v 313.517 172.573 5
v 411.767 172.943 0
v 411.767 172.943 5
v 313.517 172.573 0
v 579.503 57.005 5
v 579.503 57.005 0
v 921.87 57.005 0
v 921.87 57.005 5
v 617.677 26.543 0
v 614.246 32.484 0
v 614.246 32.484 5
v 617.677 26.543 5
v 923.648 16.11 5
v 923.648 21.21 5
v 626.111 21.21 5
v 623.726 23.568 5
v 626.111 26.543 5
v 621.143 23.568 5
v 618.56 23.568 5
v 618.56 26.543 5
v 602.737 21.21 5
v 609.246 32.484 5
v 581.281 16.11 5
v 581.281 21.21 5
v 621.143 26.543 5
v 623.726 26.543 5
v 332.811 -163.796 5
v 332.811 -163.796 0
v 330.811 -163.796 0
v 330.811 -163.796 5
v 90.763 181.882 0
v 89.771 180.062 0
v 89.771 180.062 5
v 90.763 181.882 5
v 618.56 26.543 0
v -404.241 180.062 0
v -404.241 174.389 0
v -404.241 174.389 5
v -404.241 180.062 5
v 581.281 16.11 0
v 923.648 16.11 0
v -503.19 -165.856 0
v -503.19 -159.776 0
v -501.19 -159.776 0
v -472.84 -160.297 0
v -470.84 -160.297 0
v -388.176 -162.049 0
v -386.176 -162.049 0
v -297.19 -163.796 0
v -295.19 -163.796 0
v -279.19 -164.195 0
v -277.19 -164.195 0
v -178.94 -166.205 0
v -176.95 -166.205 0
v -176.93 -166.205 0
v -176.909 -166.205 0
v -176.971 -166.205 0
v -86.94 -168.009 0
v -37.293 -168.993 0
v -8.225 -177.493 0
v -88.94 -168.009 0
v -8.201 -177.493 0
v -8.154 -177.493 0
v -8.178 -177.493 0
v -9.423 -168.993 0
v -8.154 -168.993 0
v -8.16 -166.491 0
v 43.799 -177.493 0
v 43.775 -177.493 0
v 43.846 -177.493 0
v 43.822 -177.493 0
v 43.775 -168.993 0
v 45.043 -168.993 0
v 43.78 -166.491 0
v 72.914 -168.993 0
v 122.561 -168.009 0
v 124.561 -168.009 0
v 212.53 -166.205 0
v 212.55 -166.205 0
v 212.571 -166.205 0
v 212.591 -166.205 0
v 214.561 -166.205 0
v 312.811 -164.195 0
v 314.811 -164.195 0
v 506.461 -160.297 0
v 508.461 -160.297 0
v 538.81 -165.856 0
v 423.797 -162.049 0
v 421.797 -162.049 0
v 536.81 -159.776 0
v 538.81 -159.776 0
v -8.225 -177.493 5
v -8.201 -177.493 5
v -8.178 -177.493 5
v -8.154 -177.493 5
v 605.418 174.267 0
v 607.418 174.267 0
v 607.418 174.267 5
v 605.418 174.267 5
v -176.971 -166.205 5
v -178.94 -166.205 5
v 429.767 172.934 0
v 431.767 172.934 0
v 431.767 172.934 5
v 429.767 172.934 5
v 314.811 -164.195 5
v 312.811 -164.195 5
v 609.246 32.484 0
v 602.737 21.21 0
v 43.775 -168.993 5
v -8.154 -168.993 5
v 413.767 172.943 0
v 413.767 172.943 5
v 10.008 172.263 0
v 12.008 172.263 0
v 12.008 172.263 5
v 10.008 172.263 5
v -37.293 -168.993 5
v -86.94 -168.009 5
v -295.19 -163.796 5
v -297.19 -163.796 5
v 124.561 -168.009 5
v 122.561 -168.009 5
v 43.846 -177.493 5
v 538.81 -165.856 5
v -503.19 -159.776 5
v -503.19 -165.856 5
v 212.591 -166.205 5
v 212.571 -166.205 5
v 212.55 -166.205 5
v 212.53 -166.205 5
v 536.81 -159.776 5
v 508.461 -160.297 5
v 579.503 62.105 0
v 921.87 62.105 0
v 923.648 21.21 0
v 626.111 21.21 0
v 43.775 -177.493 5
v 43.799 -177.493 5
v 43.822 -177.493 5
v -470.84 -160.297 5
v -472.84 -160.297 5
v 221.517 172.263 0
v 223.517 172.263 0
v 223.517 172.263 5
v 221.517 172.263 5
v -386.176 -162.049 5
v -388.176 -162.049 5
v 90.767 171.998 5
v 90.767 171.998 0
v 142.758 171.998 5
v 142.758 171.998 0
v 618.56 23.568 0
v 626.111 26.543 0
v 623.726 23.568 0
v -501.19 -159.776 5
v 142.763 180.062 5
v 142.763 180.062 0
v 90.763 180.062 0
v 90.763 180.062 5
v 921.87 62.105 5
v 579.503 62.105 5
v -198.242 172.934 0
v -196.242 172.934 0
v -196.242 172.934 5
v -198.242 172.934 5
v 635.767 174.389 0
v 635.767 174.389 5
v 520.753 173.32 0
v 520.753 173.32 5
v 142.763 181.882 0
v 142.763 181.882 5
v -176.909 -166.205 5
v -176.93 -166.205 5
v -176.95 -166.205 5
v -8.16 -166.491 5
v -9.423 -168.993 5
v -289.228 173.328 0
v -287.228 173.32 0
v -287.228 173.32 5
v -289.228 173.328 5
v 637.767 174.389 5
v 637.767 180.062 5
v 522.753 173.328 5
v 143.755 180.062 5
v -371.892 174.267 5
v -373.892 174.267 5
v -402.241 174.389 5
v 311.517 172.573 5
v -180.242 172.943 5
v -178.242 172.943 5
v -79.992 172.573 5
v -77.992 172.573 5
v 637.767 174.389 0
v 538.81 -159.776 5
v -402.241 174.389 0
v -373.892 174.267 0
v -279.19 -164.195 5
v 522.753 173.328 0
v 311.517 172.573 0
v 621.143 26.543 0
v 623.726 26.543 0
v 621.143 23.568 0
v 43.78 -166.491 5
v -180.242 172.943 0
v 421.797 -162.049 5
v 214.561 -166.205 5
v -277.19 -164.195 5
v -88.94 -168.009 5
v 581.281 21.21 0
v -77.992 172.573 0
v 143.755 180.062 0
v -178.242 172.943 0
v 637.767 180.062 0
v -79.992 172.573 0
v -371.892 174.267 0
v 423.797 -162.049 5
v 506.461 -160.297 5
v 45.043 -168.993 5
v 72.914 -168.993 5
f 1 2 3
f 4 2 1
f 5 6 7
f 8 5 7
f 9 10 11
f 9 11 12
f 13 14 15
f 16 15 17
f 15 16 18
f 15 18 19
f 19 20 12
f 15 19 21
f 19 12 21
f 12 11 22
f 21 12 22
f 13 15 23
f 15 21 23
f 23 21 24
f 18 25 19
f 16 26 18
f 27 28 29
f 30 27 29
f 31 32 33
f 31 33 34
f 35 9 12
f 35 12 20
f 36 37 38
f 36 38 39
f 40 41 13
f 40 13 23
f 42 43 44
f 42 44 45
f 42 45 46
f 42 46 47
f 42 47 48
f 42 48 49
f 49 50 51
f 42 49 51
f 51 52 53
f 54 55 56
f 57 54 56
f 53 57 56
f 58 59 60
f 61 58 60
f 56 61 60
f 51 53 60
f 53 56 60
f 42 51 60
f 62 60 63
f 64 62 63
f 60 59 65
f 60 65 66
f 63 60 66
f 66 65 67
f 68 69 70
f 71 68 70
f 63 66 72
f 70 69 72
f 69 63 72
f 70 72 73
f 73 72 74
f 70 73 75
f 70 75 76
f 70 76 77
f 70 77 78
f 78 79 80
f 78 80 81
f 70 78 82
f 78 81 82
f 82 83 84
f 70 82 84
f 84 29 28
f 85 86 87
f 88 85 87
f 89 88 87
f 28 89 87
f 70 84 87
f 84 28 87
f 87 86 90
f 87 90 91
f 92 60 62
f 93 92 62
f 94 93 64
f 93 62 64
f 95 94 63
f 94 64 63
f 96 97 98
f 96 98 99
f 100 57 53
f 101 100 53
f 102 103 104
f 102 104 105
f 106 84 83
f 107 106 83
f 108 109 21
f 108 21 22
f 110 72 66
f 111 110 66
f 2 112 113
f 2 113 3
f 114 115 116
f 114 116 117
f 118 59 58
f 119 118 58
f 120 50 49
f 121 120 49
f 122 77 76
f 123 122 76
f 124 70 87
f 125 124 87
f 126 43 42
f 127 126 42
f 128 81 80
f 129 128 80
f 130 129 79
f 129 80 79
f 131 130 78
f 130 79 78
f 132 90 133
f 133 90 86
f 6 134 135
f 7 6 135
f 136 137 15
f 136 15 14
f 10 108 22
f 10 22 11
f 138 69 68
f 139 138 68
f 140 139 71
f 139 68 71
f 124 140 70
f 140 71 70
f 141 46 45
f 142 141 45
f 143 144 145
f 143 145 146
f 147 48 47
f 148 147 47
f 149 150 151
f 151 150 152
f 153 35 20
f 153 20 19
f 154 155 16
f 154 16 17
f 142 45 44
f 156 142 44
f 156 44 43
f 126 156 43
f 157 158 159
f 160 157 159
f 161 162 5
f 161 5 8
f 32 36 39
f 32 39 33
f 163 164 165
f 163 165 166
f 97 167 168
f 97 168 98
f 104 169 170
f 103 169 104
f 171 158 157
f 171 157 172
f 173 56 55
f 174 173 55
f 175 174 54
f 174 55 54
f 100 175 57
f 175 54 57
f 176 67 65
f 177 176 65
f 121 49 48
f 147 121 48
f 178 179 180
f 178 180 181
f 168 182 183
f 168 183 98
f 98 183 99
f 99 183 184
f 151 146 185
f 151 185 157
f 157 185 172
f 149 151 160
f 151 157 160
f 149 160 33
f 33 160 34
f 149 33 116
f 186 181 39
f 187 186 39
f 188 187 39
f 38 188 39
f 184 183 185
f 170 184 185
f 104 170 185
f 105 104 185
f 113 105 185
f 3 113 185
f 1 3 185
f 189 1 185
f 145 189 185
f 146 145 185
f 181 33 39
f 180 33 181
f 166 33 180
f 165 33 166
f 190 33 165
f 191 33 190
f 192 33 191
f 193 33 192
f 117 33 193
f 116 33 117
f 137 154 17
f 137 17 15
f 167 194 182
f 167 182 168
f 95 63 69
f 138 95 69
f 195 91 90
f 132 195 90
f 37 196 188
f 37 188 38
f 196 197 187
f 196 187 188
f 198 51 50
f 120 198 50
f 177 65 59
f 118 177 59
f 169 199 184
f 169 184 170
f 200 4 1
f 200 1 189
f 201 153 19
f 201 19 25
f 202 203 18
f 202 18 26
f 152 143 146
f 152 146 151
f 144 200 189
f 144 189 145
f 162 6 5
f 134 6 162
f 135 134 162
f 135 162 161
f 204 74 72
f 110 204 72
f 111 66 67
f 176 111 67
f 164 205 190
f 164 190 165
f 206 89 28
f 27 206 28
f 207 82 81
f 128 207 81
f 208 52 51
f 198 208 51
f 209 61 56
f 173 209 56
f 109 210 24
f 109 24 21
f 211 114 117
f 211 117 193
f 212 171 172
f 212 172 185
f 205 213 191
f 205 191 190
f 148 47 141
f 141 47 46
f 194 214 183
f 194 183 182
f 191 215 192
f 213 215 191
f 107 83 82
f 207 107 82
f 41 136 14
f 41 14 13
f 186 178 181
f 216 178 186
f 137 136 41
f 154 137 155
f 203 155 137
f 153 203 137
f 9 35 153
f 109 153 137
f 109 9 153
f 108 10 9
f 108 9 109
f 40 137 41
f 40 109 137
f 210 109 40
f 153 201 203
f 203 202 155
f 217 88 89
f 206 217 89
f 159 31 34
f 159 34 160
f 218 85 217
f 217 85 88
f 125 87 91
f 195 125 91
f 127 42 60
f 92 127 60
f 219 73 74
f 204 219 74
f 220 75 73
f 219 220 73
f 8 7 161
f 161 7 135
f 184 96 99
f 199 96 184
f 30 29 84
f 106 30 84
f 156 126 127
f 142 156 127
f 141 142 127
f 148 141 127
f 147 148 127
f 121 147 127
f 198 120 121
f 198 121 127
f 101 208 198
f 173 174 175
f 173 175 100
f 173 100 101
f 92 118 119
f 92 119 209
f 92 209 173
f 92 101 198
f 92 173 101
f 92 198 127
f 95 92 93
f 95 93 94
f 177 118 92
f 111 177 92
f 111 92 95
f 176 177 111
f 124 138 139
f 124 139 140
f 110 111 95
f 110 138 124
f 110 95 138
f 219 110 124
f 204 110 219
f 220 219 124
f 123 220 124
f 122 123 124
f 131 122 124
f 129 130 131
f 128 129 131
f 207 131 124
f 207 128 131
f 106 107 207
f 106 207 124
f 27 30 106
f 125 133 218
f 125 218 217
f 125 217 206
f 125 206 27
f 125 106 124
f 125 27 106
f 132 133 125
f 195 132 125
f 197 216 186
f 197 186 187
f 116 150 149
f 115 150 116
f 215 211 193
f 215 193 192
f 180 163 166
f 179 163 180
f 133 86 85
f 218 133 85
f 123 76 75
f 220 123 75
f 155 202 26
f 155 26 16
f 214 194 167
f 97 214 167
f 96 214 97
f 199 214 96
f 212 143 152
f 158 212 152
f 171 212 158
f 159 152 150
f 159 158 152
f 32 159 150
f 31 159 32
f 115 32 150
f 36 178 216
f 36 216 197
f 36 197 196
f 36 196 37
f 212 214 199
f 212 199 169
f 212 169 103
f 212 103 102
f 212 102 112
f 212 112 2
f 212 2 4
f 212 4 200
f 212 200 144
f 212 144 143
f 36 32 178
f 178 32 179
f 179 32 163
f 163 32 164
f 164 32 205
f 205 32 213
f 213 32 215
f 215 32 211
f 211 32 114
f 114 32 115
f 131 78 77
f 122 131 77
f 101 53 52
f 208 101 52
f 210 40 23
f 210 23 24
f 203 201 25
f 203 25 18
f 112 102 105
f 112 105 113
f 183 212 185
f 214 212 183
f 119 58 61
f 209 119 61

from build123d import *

# Parameters (mm, degrees)
MODEL_W           = 342.366650955
MODEL_H           = 5.1
EXTRUDE_1_DEPTH   = 5
EXTRUDE_1_2_DEPTH = 5
EXTRUDE_1_3_DEPTH = 5
EXTRUDE_1_4_DEPTH = 5


with BuildPart() as part:
    # Model → 凸台-拉伸1 (new body)
    with BuildSketch(Plane.XY):
        with Locations((750.686747378, 59.554962924)):
            Rectangle(MODEL_W, MODEL_H)
    extrude(amount=EXTRUDE_1_DEPTH)


with BuildPart() as body_2:
    # Model → Extrude 1 2 (new body)
    with BuildSketch(Plane.XY):
        Polygon((614.246138188, 32.484405329), (617.67653772, 26.54277905), (618.559903109, 26.54277905), (618.559903109, 23.568043607), (621.143191819, 26.54277905), (621.143191819, 23.568043607), (623.726480529, 26.54277905), (623.726480529, 23.568043607), (626.111252729, 26.54277905), (626.111252729, 21.209813756), (923.648003194, 21.209813756), (923.648003194, 16.109813756), (581.281303194, 16.109813756), (581.281303194, 21.209813756), (602.736749709, 21.209813756), (609.246138188, 32.484405329), align=None)
    extrude(amount=EXTRUDE_1_2_DEPTH)


with BuildPart() as body_3:
    # Model → Extrude 1 3 (new body)
    with BuildSketch(Plane.XY):
        Polygon((143.754855357, 180.061566324), (637.766892066, 180.061566324), (637.766892066, 174.389466324), (635.766892066, 174.389466324), (607.417562069, 174.266766324), (605.417562069, 174.266766324), (522.753244134, 173.328437251), (520.753244134, 173.319766324), (431.767168163, 172.933970442), (429.767168163, 172.933966324), (413.767168163, 172.942566324), (411.767168163, 172.942566324), (313.517246909, 172.572666324), (311.517246909, 172.572666324), (223.517246909, 172.262766324), (221.517246909, 172.262766324), (142.758356713, 171.99776752), (116.762748322, 171.99776752), (90.767139931, 171.99776752), (12.008249736, 172.262766324), (10.008249736, 172.262766324), (-77.991750264, 172.572666324), (-79.991750264, 172.572666324), (-178.241671518, 172.942566324), (-180.241671518, 172.942566324), (-196.241671518, 172.933966324), (-198.241671518, 172.933970442), (-287.227747489, 173.319766324), (-289.227747489, 173.328437251), (-371.892065424, 174.266766324), (-373.892065424, 174.266766324), (-402.241395422, 174.389466324), (-404.241395422, 174.389466324), (-404.241395422, 180.061566324), (89.770641288, 180.061566324), (90.762748322, 181.881511431), (90.762748322, 180.061566324), (116.762748322, 180.061566324), (142.762748322, 180.061566324), (142.762748322, 181.881511431), align=None)
    extrude(amount=EXTRUDE_1_3_DEPTH)


with BuildPart() as body_4:
    # Model → Extrude 1 4 (new body)
    with BuildSketch(Plane.XY):
        with BuildLine():
            Line((43.845523177, -177.492582663), (538.81027344, -165.856176204))
            Line((538.81027344, -165.856176204), (538.81027344, -159.776195336))
            Line((538.81027344, -159.776195336), (536.81027344, -159.776195336))
            Line((536.81027344, -159.776195336), (508.460943442, -160.297194912))
            Line((508.460943442, -160.297194912), (506.460943442, -160.297194912))
            Line((506.460943442, -160.297194912), (423.796625507, -162.048616282))
            Line((423.796625507, -162.048616282), (421.796625507, -162.048616282))
            Line((421.796625507, -162.048616282), (332.810549536, -163.795959439))
            Line((332.810549536, -163.795959439), (330.810549536, -163.795959439))
            Line((330.810549536, -163.795959439), (314.810549536, -164.194907743))
            Line((314.810549536, -164.194907743), (312.810549536, -164.194907743))
            Line((312.810549536, -164.194907743), (214.560628282, -166.204763766))
            Line((214.560628282, -166.204763766), (212.591381202, -166.204763766))
            ThreePointArc((212.591381202, -166.204763766), (212.560629898, -166.204921378), (212.529881824, -166.205394195))
            Line((212.529881824, -166.205394195), (124.560628282, -168.009124705))
            Line((124.560628282, -168.009124705), (122.560628282, -168.009124705))
            Line((122.560628282, -168.009124705), (72.913804388, -168.993411369))
            Line((72.913804388, -168.993411369), (45.043435184, -168.993411369))
            Line((45.043435184, -168.993411369), (43.780250092, -166.49051255))
            Line((43.780250092, -166.49051255), (43.775013962, -168.993411369))
            Line((43.775013962, -168.993411369), (17.81027344, -168.993411369))
            Line((17.81027344, -168.993411369), (-8.154467083, -168.993411369))
            Line((-8.154467083, -168.993411369), (-8.159703213, -166.49051255))
            Line((-8.159703213, -166.49051255), (-9.422888304, -168.993411369))
            Line((-9.422888304, -168.993411369), (-37.293257509, -168.993411369))
            Line((-37.293257509, -168.993411369), (-86.940081403, -168.009124705))
            Line((-86.940081403, -168.009124705), (-88.940081403, -168.009124705))
            Line((-88.940081403, -168.009124705), (-176.909334945, -166.205394195))
            ThreePointArc((-176.909334945, -166.205394195), (-176.940083018, -166.204921378), (-176.970834323, -166.204763766))
            Line((-176.970834323, -166.204763766), (-178.940081403, -166.204763766))
            Line((-178.940081403, -166.204763766), (-277.190002657, -164.194907743))
            Line((-277.190002657, -164.194907743), (-279.190002657, -164.194907743))
            Line((-279.190002657, -164.194907743), (-295.190002657, -163.795959439))
            Line((-295.190002657, -163.795959439), (-297.190002657, -163.795959439))
            Line((-297.190002657, -163.795959439), (-386.176078628, -162.048616282))
            Line((-386.176078628, -162.048616282), (-388.176078628, -162.048616282))
            Line((-388.176078628, -162.048616282), (-470.840396563, -160.297194912))
            Line((-470.840396563, -160.297194912), (-472.840396563, -160.297194912))
            Line((-472.840396563, -160.297194912), (-501.18972656, -159.776195336))
            Line((-501.18972656, -159.776195336), (-503.18972656, -159.776195336))
            Line((-503.18972656, -159.776195336), (-503.18972656, -165.856176204))
            Line((-503.18972656, -165.856176204), (-8.224976298, -177.492582663))
            ThreePointArc((-8.224976298, -177.492582663), (-8.189724125, -177.493204186), (-8.154467083, -177.493411369))
            Line((-8.154467083, -177.493411369), (17.81027344, -177.493411369))
            Line((17.81027344, -177.493411369), (43.775013962, -177.493411369))
            ThreePointArc((43.775013962, -177.493411369), (43.810271005, -177.493204186), (43.845523177, -177.492582663))
        make_face()
    extrude(amount=EXTRUDE_1_4_DEPTH)


solid = Compound([part.part, body_2.part, body_3.part, body_4.part])
